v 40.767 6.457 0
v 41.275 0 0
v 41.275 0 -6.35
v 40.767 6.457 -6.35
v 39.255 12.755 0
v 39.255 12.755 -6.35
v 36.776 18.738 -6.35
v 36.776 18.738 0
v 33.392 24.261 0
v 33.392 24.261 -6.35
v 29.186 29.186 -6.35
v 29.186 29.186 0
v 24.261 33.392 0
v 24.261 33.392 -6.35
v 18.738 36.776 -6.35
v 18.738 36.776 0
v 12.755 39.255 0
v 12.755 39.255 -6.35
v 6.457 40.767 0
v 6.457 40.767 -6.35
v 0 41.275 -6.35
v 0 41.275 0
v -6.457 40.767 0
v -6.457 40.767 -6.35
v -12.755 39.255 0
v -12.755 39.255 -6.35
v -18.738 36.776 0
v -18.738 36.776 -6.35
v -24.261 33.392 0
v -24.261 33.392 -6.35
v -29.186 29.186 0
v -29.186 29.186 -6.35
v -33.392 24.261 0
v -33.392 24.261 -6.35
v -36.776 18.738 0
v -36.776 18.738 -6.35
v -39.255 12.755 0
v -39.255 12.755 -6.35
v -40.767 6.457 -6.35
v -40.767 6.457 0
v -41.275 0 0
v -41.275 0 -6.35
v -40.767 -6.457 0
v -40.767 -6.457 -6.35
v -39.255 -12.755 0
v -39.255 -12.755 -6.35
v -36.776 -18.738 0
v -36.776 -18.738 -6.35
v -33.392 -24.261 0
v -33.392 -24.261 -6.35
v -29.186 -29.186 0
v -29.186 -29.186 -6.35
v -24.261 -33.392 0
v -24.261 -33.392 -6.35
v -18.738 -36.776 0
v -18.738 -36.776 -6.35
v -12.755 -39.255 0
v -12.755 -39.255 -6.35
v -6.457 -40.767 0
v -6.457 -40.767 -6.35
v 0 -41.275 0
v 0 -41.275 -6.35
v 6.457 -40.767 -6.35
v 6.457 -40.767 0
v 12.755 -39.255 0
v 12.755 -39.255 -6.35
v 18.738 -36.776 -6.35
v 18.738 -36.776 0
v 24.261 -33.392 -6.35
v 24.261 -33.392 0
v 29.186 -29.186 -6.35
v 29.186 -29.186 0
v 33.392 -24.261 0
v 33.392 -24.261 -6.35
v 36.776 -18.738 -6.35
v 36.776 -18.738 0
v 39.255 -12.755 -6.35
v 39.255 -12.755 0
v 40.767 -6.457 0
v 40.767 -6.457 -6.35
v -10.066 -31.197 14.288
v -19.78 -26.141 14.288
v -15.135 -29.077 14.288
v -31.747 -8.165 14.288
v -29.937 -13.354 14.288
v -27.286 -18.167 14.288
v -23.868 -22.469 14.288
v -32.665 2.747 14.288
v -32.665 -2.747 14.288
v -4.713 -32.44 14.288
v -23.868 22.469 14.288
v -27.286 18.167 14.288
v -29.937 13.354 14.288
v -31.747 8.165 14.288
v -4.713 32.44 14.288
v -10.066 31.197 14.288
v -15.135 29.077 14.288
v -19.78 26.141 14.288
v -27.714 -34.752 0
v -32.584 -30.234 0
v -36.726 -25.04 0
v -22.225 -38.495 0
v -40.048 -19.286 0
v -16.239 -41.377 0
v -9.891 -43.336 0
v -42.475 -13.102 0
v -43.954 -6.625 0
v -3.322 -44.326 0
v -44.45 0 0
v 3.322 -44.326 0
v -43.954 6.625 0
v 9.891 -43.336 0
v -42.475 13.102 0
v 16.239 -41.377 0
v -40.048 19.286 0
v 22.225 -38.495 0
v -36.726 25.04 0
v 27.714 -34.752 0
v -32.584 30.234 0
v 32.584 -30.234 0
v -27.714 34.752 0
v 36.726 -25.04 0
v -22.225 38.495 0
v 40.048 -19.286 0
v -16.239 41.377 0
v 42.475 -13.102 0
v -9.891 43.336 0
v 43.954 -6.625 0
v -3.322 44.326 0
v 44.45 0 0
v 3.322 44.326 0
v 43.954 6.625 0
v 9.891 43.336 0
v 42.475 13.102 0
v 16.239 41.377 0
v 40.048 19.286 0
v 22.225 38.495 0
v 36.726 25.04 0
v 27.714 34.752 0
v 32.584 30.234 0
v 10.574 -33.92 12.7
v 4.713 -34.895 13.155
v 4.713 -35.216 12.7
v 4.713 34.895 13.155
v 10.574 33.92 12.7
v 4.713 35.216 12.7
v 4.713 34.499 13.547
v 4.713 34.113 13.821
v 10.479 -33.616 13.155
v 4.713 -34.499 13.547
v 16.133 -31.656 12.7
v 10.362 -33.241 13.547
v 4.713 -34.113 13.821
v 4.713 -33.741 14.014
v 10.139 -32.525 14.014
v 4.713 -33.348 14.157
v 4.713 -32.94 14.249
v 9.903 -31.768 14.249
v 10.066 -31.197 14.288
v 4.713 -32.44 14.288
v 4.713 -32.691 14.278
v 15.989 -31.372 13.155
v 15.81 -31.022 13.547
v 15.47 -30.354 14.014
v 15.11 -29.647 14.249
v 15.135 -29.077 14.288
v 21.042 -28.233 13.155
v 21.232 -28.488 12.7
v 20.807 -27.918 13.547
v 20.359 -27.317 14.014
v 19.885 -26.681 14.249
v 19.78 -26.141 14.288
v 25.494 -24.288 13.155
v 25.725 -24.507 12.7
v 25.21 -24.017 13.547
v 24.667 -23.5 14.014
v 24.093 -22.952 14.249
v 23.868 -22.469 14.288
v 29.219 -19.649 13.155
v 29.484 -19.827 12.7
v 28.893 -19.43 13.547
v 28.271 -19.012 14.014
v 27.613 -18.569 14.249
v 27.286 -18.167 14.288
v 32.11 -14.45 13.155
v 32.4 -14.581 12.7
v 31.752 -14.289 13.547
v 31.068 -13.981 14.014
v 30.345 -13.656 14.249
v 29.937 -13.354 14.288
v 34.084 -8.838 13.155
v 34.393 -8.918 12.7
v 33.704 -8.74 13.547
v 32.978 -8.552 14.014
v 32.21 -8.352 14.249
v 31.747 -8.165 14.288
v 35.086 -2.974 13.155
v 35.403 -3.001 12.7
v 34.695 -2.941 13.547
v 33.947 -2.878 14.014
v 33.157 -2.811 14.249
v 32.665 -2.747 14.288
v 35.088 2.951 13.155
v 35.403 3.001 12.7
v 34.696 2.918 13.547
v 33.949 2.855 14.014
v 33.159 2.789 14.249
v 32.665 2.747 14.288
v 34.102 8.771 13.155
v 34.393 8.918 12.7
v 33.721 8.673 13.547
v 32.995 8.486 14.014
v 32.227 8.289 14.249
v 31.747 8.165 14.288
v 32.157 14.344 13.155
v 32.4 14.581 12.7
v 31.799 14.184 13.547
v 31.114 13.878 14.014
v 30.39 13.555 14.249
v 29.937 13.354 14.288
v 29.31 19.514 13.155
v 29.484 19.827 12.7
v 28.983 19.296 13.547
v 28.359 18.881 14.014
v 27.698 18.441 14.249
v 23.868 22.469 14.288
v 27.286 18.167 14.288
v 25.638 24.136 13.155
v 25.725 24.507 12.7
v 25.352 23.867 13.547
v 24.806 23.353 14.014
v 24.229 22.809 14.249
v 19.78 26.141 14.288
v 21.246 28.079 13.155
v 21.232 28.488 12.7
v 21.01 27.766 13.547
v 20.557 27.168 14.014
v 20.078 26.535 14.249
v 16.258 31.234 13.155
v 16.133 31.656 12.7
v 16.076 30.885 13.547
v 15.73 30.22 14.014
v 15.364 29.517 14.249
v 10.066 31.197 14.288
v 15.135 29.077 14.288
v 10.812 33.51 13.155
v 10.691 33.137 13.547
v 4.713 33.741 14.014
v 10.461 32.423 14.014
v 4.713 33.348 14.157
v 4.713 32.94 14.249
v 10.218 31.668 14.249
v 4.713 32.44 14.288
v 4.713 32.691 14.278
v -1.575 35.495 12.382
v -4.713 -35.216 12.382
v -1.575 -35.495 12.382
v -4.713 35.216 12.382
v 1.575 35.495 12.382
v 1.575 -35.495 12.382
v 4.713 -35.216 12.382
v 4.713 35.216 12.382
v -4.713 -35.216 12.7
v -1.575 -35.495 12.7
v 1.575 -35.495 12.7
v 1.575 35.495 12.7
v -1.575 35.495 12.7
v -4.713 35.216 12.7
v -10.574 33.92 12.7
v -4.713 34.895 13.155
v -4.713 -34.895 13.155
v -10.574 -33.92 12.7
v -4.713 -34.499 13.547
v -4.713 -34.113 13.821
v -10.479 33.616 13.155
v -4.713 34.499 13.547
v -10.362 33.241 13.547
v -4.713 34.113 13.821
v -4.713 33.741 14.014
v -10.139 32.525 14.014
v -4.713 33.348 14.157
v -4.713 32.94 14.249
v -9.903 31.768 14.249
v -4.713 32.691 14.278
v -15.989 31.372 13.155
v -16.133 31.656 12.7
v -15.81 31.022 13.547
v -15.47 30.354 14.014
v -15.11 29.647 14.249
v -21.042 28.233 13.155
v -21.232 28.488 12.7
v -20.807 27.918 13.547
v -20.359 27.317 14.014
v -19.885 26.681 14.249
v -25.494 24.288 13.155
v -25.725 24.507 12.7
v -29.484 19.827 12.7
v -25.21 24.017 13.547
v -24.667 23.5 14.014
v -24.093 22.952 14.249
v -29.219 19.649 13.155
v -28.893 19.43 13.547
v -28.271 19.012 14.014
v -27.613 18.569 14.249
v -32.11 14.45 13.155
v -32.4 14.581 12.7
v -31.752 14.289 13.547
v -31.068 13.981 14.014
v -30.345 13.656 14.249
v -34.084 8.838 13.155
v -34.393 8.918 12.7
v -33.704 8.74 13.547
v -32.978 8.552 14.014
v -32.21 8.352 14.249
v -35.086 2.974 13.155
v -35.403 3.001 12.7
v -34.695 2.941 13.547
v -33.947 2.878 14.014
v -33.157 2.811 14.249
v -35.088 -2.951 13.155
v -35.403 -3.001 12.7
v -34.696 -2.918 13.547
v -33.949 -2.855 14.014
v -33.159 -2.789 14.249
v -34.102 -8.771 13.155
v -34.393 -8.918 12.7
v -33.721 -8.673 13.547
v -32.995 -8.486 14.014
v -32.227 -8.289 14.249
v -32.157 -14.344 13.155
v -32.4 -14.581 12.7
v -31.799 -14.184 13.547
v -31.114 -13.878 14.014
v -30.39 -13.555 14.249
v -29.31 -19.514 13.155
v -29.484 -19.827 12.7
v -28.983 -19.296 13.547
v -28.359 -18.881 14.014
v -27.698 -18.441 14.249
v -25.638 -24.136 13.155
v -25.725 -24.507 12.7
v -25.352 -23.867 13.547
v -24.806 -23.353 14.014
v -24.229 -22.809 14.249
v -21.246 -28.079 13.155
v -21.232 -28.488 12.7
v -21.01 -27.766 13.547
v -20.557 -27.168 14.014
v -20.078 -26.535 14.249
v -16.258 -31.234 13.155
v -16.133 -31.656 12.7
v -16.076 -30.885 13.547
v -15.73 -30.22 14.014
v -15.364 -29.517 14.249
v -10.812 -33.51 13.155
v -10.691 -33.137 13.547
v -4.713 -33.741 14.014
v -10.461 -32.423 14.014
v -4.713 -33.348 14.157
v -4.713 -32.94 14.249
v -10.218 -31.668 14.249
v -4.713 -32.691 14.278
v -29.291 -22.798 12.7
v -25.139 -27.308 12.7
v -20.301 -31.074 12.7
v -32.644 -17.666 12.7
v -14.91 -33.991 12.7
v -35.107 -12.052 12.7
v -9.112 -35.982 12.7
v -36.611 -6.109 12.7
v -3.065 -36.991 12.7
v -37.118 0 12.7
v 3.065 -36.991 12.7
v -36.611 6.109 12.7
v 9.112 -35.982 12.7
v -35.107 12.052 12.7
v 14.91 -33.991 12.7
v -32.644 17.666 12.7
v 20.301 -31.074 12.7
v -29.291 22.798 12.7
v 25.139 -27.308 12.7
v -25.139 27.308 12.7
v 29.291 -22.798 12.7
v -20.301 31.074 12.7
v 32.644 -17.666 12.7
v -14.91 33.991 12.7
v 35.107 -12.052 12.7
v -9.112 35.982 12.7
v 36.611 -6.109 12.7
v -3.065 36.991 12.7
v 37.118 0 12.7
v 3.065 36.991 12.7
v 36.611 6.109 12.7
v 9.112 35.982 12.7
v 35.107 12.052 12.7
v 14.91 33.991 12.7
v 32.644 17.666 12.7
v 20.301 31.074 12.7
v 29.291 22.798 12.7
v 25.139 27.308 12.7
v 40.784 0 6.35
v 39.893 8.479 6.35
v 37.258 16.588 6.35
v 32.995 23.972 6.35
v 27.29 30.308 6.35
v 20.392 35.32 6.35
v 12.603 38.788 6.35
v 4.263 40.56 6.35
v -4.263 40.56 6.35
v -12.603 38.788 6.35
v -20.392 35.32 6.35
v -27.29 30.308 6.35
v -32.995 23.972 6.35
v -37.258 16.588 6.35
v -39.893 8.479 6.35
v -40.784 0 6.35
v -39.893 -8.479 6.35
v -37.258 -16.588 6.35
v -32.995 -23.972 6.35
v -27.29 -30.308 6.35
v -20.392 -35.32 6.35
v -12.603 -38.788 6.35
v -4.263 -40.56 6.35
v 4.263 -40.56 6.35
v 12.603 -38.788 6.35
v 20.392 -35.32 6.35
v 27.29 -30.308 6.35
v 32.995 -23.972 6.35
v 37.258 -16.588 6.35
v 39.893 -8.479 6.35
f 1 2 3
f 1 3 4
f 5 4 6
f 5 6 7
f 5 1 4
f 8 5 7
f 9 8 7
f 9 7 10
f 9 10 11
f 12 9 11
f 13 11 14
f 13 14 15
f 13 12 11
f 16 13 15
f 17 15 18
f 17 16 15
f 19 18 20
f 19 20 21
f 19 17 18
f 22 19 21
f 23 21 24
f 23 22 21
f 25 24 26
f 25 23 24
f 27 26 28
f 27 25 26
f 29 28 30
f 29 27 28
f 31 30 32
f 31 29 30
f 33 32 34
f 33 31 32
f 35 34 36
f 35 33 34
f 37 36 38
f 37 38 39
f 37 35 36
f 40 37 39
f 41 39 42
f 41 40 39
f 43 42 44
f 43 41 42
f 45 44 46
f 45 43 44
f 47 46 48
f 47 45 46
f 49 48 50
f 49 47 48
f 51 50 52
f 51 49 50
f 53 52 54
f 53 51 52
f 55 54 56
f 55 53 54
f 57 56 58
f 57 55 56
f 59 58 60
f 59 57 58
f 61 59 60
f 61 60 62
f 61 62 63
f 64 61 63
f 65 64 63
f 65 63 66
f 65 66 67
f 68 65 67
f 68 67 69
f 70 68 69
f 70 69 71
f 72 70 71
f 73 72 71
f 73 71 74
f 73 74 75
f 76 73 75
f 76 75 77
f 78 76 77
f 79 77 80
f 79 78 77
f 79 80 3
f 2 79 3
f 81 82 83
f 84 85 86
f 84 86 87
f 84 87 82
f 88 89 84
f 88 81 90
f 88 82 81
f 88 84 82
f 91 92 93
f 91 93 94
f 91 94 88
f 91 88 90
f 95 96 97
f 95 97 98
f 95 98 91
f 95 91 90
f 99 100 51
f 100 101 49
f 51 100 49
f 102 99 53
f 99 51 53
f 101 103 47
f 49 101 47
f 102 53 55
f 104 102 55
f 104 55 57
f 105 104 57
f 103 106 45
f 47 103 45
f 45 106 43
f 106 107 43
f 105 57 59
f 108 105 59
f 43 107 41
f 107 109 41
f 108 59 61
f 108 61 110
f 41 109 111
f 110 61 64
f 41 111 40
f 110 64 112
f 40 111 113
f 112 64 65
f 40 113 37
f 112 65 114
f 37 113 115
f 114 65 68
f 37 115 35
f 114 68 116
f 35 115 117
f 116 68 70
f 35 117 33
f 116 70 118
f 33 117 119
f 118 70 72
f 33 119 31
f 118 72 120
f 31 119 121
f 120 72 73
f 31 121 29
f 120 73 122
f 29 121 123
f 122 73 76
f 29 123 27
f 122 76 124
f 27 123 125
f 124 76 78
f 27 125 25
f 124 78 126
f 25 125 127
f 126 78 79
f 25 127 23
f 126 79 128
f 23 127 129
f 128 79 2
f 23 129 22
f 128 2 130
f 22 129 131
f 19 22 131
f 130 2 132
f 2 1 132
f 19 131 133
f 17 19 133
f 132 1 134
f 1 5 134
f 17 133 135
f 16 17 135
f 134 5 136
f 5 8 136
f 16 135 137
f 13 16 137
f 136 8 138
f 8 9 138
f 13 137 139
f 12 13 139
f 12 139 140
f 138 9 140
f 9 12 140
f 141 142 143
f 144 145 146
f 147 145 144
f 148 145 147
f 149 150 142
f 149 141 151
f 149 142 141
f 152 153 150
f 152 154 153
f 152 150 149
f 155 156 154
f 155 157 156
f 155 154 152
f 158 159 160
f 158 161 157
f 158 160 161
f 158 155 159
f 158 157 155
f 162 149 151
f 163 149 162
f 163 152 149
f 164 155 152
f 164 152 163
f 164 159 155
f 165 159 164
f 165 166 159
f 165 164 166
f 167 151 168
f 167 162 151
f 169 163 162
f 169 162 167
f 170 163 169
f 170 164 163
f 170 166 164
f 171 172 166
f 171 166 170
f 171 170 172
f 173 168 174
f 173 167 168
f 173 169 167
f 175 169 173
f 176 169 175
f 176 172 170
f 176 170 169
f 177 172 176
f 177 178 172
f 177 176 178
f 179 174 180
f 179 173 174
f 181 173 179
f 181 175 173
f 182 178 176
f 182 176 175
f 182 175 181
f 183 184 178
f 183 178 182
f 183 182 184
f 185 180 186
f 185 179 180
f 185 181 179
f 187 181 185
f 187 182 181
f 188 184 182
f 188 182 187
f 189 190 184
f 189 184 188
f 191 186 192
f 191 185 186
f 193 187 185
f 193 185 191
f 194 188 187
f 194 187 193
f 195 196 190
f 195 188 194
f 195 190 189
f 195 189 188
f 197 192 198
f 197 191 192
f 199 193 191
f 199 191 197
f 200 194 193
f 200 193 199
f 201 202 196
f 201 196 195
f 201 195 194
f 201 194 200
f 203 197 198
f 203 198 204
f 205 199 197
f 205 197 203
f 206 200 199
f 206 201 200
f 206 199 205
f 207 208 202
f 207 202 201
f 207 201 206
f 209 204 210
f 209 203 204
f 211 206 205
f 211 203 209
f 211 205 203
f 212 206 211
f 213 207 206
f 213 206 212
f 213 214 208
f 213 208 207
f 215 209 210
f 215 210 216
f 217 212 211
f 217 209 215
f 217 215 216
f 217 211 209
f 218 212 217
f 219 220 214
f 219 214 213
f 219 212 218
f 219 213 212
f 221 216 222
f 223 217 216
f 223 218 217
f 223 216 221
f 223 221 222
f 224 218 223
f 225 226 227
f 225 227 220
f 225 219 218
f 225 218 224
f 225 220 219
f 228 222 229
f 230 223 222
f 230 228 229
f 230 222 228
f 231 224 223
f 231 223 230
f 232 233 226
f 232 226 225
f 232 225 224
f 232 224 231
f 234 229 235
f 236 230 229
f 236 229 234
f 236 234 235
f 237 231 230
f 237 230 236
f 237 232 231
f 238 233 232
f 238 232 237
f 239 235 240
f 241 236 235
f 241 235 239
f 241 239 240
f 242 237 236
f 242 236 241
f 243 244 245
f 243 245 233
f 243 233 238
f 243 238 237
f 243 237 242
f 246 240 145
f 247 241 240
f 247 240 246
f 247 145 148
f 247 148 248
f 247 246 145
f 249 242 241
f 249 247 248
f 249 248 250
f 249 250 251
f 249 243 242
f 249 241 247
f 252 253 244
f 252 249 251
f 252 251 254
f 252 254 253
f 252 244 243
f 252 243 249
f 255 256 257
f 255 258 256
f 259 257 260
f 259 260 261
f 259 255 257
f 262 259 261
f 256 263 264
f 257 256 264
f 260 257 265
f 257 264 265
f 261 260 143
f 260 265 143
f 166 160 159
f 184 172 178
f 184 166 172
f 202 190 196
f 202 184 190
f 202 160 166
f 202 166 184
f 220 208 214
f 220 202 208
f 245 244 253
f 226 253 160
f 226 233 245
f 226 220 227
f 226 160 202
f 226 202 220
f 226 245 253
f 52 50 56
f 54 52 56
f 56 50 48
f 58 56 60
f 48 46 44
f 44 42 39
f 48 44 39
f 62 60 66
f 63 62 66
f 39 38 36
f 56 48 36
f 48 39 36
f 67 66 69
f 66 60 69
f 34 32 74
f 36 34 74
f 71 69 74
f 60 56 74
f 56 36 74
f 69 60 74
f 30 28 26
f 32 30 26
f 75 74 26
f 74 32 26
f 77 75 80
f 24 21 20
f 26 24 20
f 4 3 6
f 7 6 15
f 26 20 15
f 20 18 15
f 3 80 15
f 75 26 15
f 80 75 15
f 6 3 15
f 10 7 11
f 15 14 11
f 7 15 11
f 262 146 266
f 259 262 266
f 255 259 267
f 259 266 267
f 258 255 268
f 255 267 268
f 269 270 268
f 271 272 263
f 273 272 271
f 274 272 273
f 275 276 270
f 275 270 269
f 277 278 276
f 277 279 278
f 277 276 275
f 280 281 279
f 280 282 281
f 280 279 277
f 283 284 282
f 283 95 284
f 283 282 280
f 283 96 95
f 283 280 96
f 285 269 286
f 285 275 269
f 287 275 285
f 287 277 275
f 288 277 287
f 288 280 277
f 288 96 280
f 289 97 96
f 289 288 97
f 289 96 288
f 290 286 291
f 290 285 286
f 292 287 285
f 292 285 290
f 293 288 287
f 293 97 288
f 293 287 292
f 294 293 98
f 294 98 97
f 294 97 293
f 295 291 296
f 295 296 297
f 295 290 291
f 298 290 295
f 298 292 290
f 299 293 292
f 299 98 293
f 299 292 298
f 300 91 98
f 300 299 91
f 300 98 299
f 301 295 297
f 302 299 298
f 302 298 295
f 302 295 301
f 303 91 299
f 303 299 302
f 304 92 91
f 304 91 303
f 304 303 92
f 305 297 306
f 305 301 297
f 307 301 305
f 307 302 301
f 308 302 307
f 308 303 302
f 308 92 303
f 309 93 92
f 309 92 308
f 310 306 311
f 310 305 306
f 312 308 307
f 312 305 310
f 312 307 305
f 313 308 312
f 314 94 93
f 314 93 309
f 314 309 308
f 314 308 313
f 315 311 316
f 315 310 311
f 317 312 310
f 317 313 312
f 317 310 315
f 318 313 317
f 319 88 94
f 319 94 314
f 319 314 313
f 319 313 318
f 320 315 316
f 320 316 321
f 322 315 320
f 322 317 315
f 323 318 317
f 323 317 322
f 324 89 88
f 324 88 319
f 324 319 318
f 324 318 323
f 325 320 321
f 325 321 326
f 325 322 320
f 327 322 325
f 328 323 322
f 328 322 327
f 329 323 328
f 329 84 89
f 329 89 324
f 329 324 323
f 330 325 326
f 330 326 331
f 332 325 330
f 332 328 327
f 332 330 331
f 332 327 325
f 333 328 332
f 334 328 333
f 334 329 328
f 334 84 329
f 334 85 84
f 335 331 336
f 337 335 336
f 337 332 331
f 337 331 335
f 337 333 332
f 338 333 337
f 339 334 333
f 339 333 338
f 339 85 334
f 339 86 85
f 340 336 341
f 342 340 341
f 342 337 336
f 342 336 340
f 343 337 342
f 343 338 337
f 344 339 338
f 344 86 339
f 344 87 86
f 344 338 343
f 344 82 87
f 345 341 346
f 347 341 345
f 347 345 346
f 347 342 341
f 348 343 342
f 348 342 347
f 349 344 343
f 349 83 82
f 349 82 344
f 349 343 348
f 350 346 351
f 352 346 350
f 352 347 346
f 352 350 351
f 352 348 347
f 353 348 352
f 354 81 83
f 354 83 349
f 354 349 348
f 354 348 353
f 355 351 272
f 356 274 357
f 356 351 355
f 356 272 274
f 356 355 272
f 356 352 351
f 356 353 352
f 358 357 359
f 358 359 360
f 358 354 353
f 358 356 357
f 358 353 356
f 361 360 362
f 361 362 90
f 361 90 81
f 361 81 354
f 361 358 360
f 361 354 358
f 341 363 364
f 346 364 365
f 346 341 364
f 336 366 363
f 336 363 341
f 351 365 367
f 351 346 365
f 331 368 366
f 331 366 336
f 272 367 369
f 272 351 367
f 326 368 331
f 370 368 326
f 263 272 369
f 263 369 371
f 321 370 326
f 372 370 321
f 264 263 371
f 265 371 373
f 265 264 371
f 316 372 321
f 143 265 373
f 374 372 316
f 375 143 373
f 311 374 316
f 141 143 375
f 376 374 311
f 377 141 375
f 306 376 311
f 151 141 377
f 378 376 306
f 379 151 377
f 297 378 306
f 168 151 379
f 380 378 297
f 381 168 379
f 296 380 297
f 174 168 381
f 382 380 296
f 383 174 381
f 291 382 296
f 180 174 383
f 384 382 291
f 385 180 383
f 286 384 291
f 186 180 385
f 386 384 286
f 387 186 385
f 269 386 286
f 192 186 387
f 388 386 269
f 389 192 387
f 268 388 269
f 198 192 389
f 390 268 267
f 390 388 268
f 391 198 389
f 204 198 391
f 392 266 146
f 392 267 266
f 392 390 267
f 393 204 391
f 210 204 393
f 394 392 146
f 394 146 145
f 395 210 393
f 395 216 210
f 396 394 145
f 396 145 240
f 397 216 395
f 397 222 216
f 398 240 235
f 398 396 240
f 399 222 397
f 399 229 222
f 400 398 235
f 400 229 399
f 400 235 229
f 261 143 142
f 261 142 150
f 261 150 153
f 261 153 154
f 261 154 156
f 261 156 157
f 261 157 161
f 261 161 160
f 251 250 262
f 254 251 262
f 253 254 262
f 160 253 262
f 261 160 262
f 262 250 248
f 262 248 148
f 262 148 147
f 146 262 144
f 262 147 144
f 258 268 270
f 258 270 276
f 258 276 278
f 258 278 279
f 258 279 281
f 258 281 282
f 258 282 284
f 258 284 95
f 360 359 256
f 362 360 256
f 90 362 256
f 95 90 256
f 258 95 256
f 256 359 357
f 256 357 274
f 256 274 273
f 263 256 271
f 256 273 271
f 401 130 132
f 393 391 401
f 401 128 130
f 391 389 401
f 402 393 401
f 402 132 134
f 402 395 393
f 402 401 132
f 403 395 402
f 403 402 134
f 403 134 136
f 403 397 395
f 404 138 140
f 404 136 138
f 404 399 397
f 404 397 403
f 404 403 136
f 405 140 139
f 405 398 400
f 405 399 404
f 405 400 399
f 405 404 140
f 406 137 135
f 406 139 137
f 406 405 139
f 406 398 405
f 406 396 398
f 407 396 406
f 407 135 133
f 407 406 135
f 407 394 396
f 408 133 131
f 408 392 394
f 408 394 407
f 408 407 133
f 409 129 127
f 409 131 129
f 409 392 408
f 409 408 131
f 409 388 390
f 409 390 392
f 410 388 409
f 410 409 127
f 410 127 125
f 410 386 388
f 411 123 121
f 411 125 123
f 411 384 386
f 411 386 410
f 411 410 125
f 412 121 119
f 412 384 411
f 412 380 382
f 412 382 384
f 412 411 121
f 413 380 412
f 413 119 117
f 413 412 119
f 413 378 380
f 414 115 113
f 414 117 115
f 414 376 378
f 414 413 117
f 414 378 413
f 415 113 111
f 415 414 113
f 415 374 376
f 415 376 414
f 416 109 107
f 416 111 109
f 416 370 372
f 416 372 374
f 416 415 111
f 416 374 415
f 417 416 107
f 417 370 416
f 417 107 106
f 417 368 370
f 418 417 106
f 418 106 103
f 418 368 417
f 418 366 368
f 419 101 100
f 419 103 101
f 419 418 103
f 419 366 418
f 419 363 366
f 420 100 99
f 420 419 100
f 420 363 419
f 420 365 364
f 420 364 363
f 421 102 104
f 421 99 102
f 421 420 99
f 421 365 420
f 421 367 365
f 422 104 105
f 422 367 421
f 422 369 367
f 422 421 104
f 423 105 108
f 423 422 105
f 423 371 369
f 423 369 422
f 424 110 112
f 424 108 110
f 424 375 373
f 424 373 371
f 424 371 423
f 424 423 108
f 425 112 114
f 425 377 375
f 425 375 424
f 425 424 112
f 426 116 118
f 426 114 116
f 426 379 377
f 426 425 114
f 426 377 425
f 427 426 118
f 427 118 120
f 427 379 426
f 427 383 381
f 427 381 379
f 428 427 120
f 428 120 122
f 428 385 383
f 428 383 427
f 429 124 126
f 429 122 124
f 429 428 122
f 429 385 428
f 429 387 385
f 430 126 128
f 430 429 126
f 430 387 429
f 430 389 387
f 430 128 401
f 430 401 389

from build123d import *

# Parameters (mm, degrees)
F0_R     = 44.45
F0_R_2   = 41.275
F1_DEPTH = 12.7
F1_TAPER = 30
F2_DEPTH = 6.35
F3_R     = 35.5301515813
F4_DEPTH = 1.5875
F7_DEPTH = 2.9464
F8_DEPTH = 0.3175


# Not quite as in the source:
# - a fillet or chamfer that OpenCascade refuses, or shapes differently, is made with other operations: its cross-section is extruded or revolved along the edge and cut away or added


with BuildPart() as f1:
    # F0 (on Top) → F1 (new body)
    with BuildSketch(Plane.XY):
        Circle(F0_R)
        Circle(F0_R_2, mode=Mode.SUBTRACT)
        Circle(F0_R_2)
    extrude(amount=F1_DEPTH, taper=F1_TAPER)

    # F0 (on Top) → F2 (join)
    with BuildSketch(Plane.XY):
        Circle(F0_R_2)
    extrude(amount=-F2_DEPTH)

    # F3 (on face) → F4 (join)
    with BuildSketch(Plane.XY.offset(12.7)):
        Circle(F3_R)
    extrude(amount=F4_DEPTH)

    # F5: fillet of radius 3.175 on 1 edges, made by hand

    # F5_s1 → F5_t2 (revolve, cut)
    with BuildSketch(Plane.XZ):
        with BuildLine():
            ThreePointArc((35.5301515813, 12.7), (34.3680209243, 13.862130657), (32.7805209243, 14.2875))
            Line((32.7805209243, 14.2875), (35.5301515813, 14.2875))
            Line((35.5301515813, 14.2875), (35.5301515813, 12.7))
        make_face()
    revolve(axis=Axis((0, 0, 14.2875), (0, 0, 1)), mode=Mode.SUBTRACT)

    # F6 (on face) → F7 (cut)
    with BuildSketch(Plane.XY.offset(12.7)):
        with BuildLine():
            ThreePointArc((-4.7129914165, -35.0091413817), (0, -35.3249524893), (4.7129914165, -35.0091413817))
            Line((4.7129914165, -35.0091413817), (4.7129914165, 35.0091413817))
            ThreePointArc((4.7129914165, 35.0091413817), (0, 35.3249524893), (-4.7129914165, 35.0091413817))
            Line((-4.7129914165, 35.0091413817), (-4.7129914165, -35.0091413817))
        make_face()
        with BuildLine():
            ThreePointArc((-4.7129914165, -35.2161807029), (0, -35.5301515813), (4.7129914165, -35.2161807029))
            Line((4.7129914165, -35.2161807029), (4.7129914165, -35.0091413817))
            ThreePointArc((4.7129914165, -35.0091413817), (0, -35.3249524893), (-4.7129914165, -35.0091413817))
            Line((-4.7129914165, -35.0091413817), (-4.7129914165, -35.2161807029))
        make_face()
        with BuildLine():
            ThreePointArc((4.7129914165, 35.2161807029), (0, 35.5301515813), (-4.7129914165, 35.2161807029))
            Line((-4.7129914165, 35.2161807029), (-4.7129914165, 35.0091413817))
            ThreePointArc((-4.7129914165, 35.0091413817), (0, 35.3249524893), (4.7129914165, 35.0091413817))
            Line((4.7129914165, 35.0091413817), (4.7129914165, 35.2161807029))
        make_face()
    extrude(amount=F7_DEPTH, mode=Mode.SUBTRACT)

    # F6 (on face) → F8 (cut)
    with BuildSketch(Plane.XY.offset(12.7)):
        with BuildLine():
            ThreePointArc((-4.7129914165, -35.2161807029), (0, -35.5301515813), (4.7129914165, -35.2161807029))
            Line((4.7129914165, -35.2161807029), (4.7129914165, -35.0091413817))
            ThreePointArc((4.7129914165, -35.0091413817), (0, -35.3249524893), (-4.7129914165, -35.0091413817))
            Line((-4.7129914165, -35.0091413817), (-4.7129914165, -35.2161807029))
        make_face()
        with BuildLine():
            ThreePointArc((-4.7129914165, -35.0091413817), (0, -35.3249524893), (4.7129914165, -35.0091413817))
            Line((4.7129914165, -35.0091413817), (4.7129914165, 35.0091413817))
            ThreePointArc((4.7129914165, 35.0091413817), (0, 35.3249524893), (-4.7129914165, 35.0091413817))
            Line((-4.7129914165, 35.0091413817), (-4.7129914165, -35.0091413817))
        make_face()
        with BuildLine():
            ThreePointArc((4.7129914165, 35.2161807029), (0, 35.5301515813), (-4.7129914165, 35.2161807029))
            Line((-4.7129914165, 35.2161807029), (-4.7129914165, 35.0091413817))
            ThreePointArc((-4.7129914165, 35.0091413817), (0, 35.3249524893), (4.7129914165, 35.0091413817))
            Line((4.7129914165, 35.0091413817), (4.7129914165, 35.2161807029))
        make_face()
    extrude(amount=-F8_DEPTH, mode=Mode.SUBTRACT)


solid = f1.part
